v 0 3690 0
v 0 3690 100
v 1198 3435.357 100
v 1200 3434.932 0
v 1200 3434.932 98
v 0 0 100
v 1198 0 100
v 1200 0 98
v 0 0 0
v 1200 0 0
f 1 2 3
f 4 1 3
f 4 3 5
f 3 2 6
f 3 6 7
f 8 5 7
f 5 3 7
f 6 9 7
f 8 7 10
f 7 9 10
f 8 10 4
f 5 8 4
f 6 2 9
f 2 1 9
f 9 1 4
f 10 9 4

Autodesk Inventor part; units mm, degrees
ref_plane "YZ Plane" through (0, 0, 0) normal (1, 0, 0) x (0, 1, 0)
ref_plane "XZ Plane" through (0, 0, 0) normal (0, 1, 0) x (-1, 0, 0)
ref_plane "XY Plane" through (0, 0, 0) normal (0, 0, 1) x (1, 0, 0)
sketch "Sketch1" plane through (0, 0, 0) normal (0, 0, 1) x (1, 0, 0)
  line L0 (0, 0) -> (1200, 0)
  line L1 (1200, 0) -> (1200, 3690)
  line L2 (1200, 3690) -> (0, 3690)
  line L3 (0, 3690) -> (0, 0)
  dimension "d0" = 1200
  dimension "d1" = 3690
extrude "Extrusion1" add sketch "Sketch1" along normal blind 100
chamfer "Chamfer1" distance 2 angle 45 1 edges at (1200, 1845, 100)
sketch "Sketch3" plane through (0, 0, 100) normal (0, 0, 1) x (1, 0, 0)
  line L0 (1200, 3690) -> (0, 3690) projected
  line L1 (0, 3690) -> (1200, 3434.9321)
  line L2 (1200, 0) -> (1200, 3690) projected
  point P0 (0, 0)
  dimension "d7" = 12
extrude "Extrusion2" cut sketch "Sketch3" along normal through all both and the other way through all
properties part number "Sandwich Wall 1200 01"
